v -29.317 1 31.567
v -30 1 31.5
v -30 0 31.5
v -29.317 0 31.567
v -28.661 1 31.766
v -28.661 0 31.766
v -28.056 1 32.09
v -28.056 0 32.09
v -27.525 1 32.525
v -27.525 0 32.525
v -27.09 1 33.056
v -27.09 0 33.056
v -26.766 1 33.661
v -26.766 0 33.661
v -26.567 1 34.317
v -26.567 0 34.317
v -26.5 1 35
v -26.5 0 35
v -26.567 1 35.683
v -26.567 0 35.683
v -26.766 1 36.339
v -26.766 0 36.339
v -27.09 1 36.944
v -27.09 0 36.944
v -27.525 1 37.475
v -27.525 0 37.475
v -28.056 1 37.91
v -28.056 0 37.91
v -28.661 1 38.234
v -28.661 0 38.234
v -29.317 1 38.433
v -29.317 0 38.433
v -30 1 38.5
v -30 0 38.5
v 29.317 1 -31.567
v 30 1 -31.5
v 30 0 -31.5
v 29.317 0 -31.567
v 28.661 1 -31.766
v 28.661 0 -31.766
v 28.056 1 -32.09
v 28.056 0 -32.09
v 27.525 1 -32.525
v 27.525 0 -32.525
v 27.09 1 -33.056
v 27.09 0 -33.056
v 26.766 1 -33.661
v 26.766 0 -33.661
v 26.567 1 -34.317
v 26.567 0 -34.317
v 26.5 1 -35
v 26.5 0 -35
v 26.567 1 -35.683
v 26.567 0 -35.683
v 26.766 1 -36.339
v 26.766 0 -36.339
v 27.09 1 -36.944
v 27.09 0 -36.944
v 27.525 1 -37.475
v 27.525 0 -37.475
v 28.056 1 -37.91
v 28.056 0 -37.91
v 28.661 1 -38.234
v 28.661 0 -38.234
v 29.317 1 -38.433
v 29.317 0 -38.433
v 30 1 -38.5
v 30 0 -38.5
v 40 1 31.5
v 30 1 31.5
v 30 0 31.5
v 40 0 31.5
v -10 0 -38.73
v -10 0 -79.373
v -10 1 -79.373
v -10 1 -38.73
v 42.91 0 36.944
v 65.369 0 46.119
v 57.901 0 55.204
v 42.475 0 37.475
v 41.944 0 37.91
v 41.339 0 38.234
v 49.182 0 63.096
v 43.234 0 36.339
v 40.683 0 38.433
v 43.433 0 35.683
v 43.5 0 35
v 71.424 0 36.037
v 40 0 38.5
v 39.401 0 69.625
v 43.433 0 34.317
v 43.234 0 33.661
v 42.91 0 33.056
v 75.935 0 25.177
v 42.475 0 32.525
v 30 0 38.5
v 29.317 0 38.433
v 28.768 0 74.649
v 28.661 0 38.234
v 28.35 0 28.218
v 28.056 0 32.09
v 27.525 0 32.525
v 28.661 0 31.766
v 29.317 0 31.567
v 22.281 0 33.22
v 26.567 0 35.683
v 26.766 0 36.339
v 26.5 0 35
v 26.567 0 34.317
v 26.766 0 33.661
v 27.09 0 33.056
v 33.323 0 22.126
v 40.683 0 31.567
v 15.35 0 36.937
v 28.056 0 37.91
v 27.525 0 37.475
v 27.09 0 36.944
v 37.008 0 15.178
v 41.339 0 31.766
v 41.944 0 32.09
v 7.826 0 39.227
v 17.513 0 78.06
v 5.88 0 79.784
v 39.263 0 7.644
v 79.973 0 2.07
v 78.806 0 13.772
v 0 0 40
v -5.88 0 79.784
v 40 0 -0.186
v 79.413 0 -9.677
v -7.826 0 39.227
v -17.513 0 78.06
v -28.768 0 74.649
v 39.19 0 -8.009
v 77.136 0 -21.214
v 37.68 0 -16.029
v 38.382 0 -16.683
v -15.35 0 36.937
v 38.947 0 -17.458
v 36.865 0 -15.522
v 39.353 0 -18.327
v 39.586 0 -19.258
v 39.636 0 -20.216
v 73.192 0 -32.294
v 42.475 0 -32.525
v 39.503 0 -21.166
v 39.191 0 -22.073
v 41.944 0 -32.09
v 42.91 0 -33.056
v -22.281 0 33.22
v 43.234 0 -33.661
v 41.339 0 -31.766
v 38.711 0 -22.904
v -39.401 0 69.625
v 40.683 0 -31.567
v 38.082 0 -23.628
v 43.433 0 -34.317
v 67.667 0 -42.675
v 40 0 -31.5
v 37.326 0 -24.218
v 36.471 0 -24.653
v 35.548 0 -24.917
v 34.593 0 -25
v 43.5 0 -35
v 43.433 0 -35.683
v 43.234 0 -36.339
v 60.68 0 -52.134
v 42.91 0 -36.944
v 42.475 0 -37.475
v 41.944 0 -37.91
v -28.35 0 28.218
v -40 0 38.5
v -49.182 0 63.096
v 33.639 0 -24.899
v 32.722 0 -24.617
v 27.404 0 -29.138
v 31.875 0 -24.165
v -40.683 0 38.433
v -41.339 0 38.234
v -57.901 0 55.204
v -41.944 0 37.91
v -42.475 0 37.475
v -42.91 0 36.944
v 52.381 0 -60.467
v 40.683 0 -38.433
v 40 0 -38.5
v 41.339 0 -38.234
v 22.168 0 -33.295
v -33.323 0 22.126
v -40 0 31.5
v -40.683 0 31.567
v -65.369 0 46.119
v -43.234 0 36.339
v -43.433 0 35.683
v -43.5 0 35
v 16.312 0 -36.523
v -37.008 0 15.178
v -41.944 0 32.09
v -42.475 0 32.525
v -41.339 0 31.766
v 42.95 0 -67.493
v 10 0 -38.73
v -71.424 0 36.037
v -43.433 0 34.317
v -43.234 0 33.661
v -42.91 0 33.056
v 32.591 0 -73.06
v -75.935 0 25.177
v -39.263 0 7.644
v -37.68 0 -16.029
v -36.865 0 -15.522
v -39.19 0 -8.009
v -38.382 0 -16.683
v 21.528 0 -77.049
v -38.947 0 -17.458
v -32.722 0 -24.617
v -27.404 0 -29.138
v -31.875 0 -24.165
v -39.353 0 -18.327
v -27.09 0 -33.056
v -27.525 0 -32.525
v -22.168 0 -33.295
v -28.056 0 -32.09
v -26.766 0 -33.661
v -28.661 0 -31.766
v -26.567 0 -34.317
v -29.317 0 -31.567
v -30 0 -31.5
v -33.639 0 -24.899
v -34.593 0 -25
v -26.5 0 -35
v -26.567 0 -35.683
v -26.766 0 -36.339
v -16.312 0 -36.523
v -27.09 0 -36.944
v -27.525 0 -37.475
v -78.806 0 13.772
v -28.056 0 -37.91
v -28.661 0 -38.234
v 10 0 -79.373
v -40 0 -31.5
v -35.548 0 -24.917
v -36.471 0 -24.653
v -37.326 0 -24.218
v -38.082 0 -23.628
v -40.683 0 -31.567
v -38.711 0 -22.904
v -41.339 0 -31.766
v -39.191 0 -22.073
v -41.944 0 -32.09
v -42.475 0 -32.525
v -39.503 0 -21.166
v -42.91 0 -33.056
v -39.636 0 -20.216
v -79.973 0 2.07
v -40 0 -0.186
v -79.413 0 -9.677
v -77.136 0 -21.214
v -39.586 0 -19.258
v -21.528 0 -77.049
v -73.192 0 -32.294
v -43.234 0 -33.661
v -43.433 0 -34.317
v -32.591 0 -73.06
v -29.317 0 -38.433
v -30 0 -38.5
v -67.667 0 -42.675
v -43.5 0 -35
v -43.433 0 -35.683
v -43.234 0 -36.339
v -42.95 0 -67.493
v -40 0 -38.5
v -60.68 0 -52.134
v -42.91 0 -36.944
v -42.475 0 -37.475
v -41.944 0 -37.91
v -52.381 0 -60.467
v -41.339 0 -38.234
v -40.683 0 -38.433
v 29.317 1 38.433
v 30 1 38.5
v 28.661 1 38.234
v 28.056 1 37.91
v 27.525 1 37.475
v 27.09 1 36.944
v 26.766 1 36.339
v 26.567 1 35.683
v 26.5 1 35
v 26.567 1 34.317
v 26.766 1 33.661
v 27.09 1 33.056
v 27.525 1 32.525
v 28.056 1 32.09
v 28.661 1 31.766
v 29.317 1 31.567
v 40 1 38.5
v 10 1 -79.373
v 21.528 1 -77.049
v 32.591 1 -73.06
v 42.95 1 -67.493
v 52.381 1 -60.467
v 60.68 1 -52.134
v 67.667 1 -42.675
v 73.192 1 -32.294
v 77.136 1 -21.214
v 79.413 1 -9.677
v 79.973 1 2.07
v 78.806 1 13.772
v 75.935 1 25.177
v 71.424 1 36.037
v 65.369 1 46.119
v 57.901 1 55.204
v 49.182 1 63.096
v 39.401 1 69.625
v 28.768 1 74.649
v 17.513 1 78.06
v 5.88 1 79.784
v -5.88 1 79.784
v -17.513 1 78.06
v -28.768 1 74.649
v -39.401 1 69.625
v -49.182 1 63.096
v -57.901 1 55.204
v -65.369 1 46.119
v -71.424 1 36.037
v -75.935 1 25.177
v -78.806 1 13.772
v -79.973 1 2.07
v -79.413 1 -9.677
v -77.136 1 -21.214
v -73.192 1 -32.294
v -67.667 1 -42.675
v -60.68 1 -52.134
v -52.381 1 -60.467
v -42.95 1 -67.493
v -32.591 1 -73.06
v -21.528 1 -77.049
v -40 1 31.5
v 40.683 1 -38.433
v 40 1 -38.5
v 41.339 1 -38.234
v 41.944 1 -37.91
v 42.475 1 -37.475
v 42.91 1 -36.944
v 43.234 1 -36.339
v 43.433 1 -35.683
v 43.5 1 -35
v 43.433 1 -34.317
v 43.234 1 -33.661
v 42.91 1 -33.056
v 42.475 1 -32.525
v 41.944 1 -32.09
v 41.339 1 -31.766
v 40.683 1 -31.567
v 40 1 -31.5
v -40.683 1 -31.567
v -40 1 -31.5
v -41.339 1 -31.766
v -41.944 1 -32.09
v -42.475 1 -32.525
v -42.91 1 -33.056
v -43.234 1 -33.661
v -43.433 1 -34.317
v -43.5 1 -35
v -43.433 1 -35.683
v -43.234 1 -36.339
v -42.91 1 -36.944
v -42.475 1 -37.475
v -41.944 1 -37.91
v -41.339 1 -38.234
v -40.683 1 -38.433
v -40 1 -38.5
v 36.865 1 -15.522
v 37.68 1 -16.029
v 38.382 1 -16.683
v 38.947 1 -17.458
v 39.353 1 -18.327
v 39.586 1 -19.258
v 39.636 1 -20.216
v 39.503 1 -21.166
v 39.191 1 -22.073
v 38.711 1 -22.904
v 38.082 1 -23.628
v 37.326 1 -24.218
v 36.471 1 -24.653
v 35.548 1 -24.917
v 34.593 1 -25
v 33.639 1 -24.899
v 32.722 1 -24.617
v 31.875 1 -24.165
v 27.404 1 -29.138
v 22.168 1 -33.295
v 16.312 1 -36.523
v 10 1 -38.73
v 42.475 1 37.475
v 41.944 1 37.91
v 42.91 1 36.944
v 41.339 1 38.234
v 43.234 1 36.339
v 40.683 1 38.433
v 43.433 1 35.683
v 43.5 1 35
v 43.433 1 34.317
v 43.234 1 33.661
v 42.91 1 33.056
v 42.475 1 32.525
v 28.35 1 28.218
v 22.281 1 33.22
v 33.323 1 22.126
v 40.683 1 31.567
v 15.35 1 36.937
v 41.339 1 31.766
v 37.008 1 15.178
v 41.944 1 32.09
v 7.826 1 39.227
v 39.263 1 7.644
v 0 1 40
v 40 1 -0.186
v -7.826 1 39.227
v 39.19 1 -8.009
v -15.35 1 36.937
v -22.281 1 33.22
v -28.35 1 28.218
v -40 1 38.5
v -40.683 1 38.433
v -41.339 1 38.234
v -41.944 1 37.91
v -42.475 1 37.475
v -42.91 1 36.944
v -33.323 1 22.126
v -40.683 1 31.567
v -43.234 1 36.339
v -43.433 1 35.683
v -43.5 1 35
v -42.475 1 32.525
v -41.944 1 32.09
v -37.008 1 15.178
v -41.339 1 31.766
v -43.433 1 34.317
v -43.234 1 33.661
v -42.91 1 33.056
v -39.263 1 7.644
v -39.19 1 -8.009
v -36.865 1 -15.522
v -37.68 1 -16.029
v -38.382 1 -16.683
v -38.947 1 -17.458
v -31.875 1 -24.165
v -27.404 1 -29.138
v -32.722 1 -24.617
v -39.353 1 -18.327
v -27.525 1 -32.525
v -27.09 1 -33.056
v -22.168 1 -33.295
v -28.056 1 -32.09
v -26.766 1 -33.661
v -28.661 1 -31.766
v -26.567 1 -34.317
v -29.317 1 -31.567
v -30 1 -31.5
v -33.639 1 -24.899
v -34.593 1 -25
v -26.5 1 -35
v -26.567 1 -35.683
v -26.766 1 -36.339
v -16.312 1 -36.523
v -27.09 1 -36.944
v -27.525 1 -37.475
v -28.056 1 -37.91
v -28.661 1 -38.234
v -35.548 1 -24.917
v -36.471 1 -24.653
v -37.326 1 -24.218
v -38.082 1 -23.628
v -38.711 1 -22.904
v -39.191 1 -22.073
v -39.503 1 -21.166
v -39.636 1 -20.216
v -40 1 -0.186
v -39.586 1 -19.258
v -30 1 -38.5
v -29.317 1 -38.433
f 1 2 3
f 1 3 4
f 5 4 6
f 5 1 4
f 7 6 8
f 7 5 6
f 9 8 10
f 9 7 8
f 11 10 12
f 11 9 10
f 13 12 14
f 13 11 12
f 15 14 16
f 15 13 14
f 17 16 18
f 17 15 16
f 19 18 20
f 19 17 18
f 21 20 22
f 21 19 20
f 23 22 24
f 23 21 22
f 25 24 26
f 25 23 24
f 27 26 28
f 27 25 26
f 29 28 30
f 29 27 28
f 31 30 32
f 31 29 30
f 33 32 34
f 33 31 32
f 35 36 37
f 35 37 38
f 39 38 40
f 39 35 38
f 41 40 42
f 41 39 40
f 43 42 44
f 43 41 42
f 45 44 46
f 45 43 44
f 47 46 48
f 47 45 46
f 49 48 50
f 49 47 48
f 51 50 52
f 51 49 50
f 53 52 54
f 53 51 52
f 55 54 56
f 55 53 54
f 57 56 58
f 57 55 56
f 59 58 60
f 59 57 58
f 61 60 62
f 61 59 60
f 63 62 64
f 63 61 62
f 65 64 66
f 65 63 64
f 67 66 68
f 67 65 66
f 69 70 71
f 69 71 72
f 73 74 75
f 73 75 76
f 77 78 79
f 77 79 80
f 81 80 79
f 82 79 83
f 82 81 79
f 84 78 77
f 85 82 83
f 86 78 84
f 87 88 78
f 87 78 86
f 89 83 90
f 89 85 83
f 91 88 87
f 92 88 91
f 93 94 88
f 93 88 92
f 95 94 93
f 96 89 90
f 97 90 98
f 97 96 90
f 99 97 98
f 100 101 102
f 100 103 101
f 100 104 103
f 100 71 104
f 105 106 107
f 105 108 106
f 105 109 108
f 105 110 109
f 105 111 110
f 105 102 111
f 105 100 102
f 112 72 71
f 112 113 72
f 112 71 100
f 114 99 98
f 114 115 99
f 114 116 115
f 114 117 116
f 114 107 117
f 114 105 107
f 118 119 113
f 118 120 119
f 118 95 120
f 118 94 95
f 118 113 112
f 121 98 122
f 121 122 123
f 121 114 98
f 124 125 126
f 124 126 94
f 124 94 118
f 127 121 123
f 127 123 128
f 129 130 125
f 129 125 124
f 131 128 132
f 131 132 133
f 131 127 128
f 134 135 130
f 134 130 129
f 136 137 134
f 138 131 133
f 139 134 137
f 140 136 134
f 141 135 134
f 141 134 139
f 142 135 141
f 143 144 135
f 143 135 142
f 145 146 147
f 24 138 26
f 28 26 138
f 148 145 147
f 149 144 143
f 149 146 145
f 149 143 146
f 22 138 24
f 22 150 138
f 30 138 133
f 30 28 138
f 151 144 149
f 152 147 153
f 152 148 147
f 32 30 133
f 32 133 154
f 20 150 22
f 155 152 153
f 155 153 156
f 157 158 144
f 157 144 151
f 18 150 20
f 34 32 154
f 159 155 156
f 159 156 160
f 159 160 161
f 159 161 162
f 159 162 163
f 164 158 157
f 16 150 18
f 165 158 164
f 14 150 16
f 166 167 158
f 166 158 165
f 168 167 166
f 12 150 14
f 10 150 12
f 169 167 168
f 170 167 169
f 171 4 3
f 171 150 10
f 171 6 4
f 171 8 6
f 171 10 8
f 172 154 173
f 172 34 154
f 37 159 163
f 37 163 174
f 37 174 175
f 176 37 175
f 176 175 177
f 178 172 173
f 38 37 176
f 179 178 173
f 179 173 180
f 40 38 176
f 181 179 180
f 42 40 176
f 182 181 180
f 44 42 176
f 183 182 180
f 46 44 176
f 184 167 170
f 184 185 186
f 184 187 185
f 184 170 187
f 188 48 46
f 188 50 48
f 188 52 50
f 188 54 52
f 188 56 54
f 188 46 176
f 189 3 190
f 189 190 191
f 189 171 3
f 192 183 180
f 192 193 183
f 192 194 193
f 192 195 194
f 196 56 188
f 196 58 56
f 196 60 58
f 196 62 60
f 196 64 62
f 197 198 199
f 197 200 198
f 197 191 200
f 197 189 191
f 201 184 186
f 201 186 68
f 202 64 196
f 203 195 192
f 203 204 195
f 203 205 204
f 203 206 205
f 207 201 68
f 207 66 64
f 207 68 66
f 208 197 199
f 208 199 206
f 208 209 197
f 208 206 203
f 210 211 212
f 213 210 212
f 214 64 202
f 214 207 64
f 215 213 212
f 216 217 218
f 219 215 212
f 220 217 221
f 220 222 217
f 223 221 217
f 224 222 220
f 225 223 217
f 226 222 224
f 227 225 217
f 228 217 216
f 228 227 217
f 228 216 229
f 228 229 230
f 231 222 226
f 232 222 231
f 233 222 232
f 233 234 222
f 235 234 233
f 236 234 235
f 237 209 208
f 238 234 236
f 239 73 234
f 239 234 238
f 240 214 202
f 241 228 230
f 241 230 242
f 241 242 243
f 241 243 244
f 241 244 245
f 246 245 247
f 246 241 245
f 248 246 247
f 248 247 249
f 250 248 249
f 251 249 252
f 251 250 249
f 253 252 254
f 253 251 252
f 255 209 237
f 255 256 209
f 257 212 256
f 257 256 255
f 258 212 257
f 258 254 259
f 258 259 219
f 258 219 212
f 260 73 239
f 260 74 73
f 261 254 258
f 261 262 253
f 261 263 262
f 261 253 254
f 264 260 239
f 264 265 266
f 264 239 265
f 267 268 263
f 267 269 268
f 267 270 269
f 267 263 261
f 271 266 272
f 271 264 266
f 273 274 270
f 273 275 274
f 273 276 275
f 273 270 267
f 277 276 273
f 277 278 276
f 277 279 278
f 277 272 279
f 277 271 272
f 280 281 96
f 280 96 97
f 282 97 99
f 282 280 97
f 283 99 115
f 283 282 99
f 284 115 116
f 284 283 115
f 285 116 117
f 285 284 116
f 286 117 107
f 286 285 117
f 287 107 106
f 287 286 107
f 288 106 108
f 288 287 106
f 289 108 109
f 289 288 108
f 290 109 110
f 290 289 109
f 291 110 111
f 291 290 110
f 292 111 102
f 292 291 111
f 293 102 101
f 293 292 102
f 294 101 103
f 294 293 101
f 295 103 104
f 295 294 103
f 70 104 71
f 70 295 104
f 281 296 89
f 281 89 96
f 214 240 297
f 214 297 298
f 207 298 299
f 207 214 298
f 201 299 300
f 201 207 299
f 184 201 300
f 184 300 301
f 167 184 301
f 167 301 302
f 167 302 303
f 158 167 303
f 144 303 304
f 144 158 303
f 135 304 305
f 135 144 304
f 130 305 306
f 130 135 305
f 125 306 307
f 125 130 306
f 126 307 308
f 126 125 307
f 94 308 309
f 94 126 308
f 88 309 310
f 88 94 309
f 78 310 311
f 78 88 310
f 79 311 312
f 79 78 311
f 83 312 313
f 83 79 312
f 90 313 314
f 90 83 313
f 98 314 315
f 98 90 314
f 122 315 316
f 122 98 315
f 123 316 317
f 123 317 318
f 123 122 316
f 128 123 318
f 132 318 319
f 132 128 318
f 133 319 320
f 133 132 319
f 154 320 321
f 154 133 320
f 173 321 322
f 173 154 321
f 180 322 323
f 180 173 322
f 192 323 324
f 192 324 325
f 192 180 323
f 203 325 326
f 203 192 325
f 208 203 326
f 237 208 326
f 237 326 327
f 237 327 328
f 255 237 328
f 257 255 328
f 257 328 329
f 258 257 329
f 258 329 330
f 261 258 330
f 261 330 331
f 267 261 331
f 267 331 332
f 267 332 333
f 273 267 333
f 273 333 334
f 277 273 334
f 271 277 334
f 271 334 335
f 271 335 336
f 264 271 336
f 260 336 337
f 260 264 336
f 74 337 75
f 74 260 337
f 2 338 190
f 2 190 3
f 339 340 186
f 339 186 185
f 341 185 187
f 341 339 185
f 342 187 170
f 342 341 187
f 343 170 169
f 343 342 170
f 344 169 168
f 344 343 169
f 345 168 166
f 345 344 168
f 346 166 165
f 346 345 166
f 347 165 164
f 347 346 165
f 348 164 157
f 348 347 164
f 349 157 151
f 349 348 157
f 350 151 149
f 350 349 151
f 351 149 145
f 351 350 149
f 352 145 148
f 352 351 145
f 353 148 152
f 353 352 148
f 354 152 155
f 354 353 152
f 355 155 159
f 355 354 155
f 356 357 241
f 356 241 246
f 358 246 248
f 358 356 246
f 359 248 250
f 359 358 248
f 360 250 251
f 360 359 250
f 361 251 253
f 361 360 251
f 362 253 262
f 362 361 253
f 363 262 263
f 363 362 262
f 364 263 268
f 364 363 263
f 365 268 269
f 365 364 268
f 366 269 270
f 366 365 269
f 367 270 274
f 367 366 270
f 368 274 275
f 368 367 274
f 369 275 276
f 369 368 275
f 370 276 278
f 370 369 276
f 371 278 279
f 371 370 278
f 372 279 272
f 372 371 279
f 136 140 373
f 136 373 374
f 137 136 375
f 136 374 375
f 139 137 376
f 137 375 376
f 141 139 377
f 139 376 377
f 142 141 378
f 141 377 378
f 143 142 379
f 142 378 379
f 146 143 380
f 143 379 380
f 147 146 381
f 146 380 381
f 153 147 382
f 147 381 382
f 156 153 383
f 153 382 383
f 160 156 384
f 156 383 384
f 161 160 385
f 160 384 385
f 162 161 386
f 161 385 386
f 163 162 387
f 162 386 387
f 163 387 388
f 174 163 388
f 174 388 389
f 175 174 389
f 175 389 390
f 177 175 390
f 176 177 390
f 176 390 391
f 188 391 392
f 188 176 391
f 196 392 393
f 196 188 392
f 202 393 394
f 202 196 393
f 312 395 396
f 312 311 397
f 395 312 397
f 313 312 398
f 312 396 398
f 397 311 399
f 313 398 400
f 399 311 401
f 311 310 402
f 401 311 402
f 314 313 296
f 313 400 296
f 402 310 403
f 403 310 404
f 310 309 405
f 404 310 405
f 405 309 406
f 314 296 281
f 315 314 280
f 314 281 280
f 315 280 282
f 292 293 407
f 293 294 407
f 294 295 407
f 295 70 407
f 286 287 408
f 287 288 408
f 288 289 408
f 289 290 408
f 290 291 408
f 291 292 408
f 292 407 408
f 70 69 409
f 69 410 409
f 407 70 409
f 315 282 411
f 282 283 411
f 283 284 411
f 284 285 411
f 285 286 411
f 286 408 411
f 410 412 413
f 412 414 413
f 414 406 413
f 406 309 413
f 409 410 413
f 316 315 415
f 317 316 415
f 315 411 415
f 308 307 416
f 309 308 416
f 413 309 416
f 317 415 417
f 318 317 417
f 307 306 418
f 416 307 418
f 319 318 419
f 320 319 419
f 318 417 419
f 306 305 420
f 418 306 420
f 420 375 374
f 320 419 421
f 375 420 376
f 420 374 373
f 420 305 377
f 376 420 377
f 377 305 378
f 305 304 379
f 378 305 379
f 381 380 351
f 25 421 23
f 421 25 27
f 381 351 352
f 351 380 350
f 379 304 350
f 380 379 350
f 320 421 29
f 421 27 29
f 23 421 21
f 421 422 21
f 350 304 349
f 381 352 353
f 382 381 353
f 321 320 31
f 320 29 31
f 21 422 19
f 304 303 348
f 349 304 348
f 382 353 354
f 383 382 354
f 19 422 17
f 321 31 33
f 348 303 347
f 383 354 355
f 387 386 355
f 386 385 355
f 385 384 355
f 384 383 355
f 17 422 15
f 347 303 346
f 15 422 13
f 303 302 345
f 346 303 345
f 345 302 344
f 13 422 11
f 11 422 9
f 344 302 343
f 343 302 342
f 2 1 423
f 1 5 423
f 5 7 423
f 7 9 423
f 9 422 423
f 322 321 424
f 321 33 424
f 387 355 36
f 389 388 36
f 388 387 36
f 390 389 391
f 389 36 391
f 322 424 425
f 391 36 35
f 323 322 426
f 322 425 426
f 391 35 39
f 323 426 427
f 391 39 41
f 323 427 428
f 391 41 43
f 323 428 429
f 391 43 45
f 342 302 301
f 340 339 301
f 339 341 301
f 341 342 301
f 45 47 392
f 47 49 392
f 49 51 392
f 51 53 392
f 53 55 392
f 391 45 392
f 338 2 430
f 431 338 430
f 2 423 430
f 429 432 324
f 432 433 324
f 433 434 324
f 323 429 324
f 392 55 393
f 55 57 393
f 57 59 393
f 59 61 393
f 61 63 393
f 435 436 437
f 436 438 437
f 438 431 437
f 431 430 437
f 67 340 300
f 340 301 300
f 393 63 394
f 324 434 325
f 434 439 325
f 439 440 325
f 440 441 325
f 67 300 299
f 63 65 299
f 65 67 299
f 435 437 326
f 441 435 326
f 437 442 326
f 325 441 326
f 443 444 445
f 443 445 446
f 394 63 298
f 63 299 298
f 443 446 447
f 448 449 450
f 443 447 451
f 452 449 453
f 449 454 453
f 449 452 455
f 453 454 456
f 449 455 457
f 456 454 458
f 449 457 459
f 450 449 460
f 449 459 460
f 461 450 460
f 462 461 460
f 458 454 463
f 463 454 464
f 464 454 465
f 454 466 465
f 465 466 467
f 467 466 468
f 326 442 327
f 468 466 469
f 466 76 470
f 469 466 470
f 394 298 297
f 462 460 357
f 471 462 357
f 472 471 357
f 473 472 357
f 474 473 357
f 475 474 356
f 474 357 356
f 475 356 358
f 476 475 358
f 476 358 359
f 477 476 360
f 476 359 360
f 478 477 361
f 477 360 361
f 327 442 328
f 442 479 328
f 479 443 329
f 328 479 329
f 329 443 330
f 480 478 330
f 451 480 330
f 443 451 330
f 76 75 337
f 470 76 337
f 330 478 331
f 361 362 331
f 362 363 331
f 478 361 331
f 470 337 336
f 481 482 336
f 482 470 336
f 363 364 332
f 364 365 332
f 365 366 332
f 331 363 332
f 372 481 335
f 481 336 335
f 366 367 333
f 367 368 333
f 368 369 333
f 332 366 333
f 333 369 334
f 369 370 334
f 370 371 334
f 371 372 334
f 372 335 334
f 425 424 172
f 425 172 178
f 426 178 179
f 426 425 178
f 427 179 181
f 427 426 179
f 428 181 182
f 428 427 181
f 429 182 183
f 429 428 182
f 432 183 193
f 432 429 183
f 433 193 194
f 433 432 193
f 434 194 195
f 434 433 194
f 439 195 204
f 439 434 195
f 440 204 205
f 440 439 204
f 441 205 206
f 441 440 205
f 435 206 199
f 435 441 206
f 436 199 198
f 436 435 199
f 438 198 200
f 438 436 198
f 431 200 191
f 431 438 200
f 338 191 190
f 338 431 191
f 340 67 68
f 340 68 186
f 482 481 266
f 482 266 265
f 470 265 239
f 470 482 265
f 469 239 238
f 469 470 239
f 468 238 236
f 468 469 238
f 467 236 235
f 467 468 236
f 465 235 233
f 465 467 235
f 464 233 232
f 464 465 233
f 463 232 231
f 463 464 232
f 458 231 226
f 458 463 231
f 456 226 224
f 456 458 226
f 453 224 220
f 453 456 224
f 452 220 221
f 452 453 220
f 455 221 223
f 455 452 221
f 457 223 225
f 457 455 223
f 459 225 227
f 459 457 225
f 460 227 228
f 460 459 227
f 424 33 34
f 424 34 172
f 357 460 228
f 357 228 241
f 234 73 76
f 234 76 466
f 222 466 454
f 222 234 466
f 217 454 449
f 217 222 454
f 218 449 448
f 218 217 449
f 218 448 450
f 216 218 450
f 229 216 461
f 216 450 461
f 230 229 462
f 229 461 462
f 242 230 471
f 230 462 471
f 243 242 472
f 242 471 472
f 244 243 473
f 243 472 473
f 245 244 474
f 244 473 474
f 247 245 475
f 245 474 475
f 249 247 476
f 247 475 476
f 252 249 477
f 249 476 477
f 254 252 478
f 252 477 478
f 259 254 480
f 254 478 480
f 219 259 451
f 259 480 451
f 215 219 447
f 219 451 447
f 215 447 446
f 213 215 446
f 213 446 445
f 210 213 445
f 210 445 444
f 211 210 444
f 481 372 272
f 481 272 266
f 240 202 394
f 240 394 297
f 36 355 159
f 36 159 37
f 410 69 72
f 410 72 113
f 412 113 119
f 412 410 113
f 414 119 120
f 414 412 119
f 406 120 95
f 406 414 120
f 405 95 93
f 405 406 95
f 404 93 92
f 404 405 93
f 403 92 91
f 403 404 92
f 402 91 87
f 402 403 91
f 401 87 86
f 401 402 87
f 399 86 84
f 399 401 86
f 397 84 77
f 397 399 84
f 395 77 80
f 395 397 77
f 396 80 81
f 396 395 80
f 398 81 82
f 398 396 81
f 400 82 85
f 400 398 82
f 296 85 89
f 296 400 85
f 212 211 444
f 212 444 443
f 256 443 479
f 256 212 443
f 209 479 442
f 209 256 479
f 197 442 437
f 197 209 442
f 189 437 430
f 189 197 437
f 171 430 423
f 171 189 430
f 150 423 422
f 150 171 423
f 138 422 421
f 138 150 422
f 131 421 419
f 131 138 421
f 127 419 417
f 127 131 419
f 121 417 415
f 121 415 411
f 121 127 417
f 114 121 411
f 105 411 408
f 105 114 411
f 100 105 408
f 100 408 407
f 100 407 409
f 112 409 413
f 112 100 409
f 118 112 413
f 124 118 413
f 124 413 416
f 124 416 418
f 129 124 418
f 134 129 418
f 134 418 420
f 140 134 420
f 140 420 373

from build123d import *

# Parameters (mm, degrees)
EXTRUDE_1_DEPTH     = 1
CUT_EXTRUDE_1_DEPTH = 1
SKETCH_4_R          = 5
CUT_EXTRUDE_2_DEPTH = 1


with BuildPart() as part:
    # 草图1 → 凸台-拉伸1 (new body)
    with BuildSketch(Plane(origin=(0, 0, 0), x_dir=(1, 0, 0), z_dir=(0, 1, 0))):
        with BuildLine():
            Line((-10, 79.372539332), (-10, 38.729833462))
            ThreePointArc((-10, 38.729833462), (0, -40), (10, 38.729833462))
            Line((10, 38.729833462), (10, 79.372539332))
            ThreePointArc((10, 79.372539332), (0, -80), (-10, 79.372539332))
        make_face()
    extrude(amount=EXTRUDE_1_DEPTH)

    # 草图2 → 切除-拉伸1 (cut)
    with BuildSketch(Plane(origin=(0, 1, 0), x_dir=(1, 0, 0), z_dir=(0, 1, 0))):
        with BuildLine():
            Line((-40, 38.5), (-30, 38.5))
            ThreePointArc((-30, 38.5), (-26.5, 35), (-30, 31.5))
            Line((-30, 31.5), (-40, 31.5))
            ThreePointArc((-40, 31.5), (-43.5, 35), (-40, 38.5))
        make_face()
        with BuildLine():
            Line((30, 38.5), (40, 38.5))
            ThreePointArc((40, 38.5), (43.5, 35), (40, 31.5))
            Line((40, 31.5), (30, 31.5))
            ThreePointArc((30, 31.5), (26.5, 35), (30, 38.5))
        make_face()
        with BuildLine():
            Line((30, -31.5), (40, -31.5))
            ThreePointArc((40, -31.5), (43.5, -35), (40, -38.5))
            Line((40, -38.5), (30, -38.5))
            ThreePointArc((30, -38.5), (26.5, -35), (30, -31.5))
        make_face()
        with BuildLine():
            Line((-40, -31.5), (-30, -31.5))
            ThreePointArc((-30, -31.5), (-26.5, -35), (-30, -38.5))
            Line((-30, -38.5), (-40, -38.5))
            ThreePointArc((-40, -38.5), (-43.5, -35), (-40, -31.5))
        make_face()
    extrude(amount=-CUT_EXTRUDE_1_DEPTH, mode=Mode.SUBTRACT)

    # 草图4 → 切除-拉伸2 (cut)
    with BuildSketch(Plane(origin=(0, 1, 0), x_dir=(1, 0, 0), z_dir=(0, 1, 0))):
        with Locations((34.641016151, 20)):
            Circle(SKETCH_4_R)
        with Locations((-34.641016151, 20)):
            Circle(SKETCH_4_R)
    extrude(amount=-CUT_EXTRUDE_2_DEPTH, mode=Mode.SUBTRACT)


solid = part.part
